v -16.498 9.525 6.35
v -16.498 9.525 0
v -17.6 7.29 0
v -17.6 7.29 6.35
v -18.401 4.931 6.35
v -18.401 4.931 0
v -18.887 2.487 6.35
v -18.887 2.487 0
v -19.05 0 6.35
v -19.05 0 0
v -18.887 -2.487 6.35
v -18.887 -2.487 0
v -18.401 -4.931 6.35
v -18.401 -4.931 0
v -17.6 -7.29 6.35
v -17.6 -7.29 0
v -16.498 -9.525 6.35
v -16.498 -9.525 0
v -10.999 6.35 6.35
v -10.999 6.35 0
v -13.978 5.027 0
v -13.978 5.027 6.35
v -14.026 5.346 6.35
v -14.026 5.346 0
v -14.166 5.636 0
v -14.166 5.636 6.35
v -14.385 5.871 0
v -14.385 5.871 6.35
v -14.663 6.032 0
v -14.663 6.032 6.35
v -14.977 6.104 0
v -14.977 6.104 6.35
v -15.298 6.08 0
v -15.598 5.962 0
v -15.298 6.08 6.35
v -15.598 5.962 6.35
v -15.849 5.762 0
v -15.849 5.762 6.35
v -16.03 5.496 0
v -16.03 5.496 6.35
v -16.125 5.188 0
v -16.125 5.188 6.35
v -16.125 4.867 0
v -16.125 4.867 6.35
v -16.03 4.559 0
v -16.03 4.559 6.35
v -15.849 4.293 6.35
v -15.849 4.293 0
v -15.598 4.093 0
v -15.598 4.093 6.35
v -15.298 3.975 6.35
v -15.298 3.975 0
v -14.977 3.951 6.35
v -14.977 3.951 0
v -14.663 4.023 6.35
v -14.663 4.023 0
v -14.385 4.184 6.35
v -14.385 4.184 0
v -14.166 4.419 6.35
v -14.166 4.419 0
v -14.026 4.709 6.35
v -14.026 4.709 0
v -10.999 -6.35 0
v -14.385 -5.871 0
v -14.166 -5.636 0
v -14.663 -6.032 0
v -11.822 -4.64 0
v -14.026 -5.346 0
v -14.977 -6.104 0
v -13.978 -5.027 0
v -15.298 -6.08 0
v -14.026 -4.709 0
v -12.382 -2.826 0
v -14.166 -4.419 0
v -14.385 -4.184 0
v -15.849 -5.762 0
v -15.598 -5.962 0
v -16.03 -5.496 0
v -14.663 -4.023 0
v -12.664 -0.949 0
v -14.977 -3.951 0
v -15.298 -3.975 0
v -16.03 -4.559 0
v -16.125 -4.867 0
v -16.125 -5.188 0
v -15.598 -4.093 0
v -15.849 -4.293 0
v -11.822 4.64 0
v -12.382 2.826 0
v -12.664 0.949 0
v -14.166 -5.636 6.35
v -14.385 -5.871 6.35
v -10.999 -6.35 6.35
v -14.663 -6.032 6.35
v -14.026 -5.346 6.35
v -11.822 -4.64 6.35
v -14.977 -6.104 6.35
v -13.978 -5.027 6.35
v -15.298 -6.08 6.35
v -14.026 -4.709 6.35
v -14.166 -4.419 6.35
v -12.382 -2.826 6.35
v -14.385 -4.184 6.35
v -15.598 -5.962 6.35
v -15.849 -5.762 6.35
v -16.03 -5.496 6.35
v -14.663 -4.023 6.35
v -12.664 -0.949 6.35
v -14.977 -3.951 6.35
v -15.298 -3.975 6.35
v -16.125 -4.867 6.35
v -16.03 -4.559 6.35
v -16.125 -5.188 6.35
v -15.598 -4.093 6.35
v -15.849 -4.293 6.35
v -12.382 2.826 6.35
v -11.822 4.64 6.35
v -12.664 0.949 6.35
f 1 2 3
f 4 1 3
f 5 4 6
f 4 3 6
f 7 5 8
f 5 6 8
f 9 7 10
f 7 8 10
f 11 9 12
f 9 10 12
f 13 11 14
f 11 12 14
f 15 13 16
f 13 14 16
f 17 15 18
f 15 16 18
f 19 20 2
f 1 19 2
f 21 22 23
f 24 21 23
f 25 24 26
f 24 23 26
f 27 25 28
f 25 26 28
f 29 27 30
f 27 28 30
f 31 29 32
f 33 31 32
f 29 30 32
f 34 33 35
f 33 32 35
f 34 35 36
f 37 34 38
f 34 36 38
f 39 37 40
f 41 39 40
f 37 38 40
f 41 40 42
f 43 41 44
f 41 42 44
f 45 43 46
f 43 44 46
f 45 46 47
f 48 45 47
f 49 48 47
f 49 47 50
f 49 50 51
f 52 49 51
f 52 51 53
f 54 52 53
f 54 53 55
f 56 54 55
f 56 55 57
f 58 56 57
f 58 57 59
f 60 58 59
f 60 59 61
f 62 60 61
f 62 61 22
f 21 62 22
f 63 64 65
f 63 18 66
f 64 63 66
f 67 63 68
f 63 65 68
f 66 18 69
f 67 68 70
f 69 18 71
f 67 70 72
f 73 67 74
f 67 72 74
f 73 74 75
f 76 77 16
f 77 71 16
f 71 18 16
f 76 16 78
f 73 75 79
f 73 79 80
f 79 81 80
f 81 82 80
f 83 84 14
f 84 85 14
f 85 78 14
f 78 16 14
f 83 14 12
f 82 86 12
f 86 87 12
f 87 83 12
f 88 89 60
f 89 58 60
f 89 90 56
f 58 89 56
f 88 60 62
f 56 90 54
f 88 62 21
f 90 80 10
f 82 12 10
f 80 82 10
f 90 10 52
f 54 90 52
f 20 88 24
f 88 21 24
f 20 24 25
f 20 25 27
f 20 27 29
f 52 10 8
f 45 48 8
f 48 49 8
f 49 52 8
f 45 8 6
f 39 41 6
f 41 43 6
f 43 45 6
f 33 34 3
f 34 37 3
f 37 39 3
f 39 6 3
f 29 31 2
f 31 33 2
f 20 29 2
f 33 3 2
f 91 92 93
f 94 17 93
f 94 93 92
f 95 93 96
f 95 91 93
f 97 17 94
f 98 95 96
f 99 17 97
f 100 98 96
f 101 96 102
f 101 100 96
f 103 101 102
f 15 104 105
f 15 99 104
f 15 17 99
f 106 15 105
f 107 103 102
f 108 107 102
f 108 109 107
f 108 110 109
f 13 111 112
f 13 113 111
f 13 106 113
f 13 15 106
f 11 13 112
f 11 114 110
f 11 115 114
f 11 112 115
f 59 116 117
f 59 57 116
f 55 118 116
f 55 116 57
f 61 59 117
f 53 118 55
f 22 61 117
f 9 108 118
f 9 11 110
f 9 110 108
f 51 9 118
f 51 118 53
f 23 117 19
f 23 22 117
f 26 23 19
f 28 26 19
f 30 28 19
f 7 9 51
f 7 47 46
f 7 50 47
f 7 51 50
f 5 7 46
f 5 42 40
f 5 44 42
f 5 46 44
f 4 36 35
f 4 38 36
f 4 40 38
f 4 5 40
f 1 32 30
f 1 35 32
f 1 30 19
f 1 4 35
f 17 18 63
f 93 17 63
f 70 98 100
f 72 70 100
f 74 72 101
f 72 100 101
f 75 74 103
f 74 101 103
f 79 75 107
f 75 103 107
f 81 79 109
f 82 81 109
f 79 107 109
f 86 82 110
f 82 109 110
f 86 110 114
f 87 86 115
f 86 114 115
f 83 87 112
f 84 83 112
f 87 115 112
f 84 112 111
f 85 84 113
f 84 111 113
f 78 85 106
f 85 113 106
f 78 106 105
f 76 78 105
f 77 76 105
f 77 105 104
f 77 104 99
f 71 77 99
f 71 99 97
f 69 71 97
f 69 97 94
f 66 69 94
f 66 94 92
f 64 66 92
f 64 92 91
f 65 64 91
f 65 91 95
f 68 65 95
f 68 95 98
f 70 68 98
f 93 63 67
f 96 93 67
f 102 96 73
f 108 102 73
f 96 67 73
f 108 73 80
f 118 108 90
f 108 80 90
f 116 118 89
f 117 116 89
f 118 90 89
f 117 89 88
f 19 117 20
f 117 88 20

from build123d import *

# Parameters (mm, degrees)
BOSS_EXTRUDE1_DEPTH = 6.35
CUT_EXTRUDE1_REACH  = 8.35
SKETCH2_R           = 1.0795


with BuildPart() as part:
    # Sketch1 → Boss-Extrude1 (new body)
    with BuildSketch(Plane(origin=(0, 0, 0), x_dir=(0, 1, 0), z_dir=(0, 0, 1))):
        with BuildLine():
            Line((-9.525, 16.497783942), (-6.35, 10.998522628))
            ThreePointArc((-6.35, 10.998522628), (0, 12.7), (6.35, 10.998522628))
            Line((6.35, 10.998522628), (9.525, 16.497783942))
            ThreePointArc((9.525, 16.497783942), (0, 19.05), (-9.525, 16.497783942))
        make_face()
    extrude(amount=BOSS_EXTRUDE1_DEPTH)

    # Sketch2 → Cut-Extrude1 (cut, up to next)
    with BuildSketch(Plane.XY.offset(6.35), mode=Mode.PRIVATE) as cut_extrude1_sk1:
        with Locations((-15.057884182, 5.027499276)):
            Circle(SKETCH2_R)
    cut_extrude1_tool1 = extrude(cut_extrude1_sk1.sketch, amount=-CUT_EXTRUDE1_REACH, mode=Mode.PRIVATE) & part.part
    add(cut_extrude1_tool1.solids().sort_by_distance((-15.057884, 5.027499, 6.35))[0], mode=Mode.SUBTRACT)
    # Sketch2 → Cut-Extrude1 (cut, up to next)
    with BuildSketch(Plane.XY.offset(6.35), mode=Mode.PRIVATE) as cut_extrude1_sk2:
        with Locations((-15.057884182, -5.027499276)):
            Circle(SKETCH2_R)
    cut_extrude1_tool2 = extrude(cut_extrude1_sk2.sketch, amount=-CUT_EXTRUDE1_REACH, mode=Mode.PRIVATE) & part.part
    add(cut_extrude1_tool2.solids().sort_by_distance((-15.057884, -5.027499, 6.35))[0], mode=Mode.SUBTRACT)


solid = part.part
